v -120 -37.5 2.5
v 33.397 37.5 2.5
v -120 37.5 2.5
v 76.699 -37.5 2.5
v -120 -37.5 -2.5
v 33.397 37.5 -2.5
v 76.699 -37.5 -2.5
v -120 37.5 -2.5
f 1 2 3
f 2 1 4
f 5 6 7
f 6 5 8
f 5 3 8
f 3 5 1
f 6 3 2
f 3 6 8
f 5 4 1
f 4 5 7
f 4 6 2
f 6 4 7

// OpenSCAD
// file: ../fixings/tube_clamp_square_base_plate_132_functions.scad
function get_L_shaft_with_base_plate_square_base_plate_132(beam_width) = 
    // (beam_width == 40) ?
    75
;
function get_R_plate_square_base_plate_132(beam_width) = 
    // (beam_width == 40) ?
    [143, 75, 18.5]
;
function get_thickness_square_base_plate_132(beam_width) = 
    // (beam_width == 40) ?
    8
;
function get_offset_hole_x_square_base_plate_132(beam_width) = 
    // (beam_width == 40) ?
    100 / 2
;
function get_diameter_hole_square_base_plate_132(beam_width) = 
    // (beam_width == 40) ?
    10
;
// file: ../fixings/tube_clamp_round_base_plate_132_functions.scad
function get_L_shaft_with_base_plate_round_base_plate_132(tube_diameter) = 
    (tube_diameter == 27) ? 
        85
    : (tube_diameter == 42) ?
        122
    : 25
;
function get_R_plate_round_base_plate_132(tube_diameter) = 
    (tube_diameter == 27) ? 
        [64, 114, 7]
    : (tube_diameter == 42) ?
        [80, 140, 10]
    : [10, 20, 1]
;
function get_offset_hole_y_round_base_plate_132(tube_diameter) = 
    (tube_diameter == 27) ? 
        38
    : (tube_diameter == 42) ?
        50
    : 10
;
function get_diameter_hole_round_base_plate_132(tube_diameter) = 10;
// file: ../fixings/tube_clamp_round_3_way_through_116_functions.scad
function  get_L_shaft_long_round_3_way_through_116(tube_diameter) = 
    (tube_diameter == 27) ? 
        42
    : (tube_diameter == 42) ?
        60
    : 25
;
function get_thickness_round_3_way_through_116(tube_diameter) = 7;
function get_L_shaft_short_round_3_way_through_116(tube_diameter) = tube_diameter + 2 * get_thickness_round_3_way_through_116();
// file: ../fixings/tube_clamp_round_tee_long_104_functions.scad
// include <../../config.scad>;

function get_L_shaft_long_round_tee_long_104(tube_diameter) = 
    (tube_diameter == 27) ? 
        85
    : (tube_diameter == 42) ?
        122
    : 25
;
function get_L_shaft_short_round_tee_long_104(tube_diameter) = 
    (tube_diameter == 27) ? 
        42
    : (tube_diameter == 42) ?
        61
    : 10
;
// file: brake_assembly_functions.scad
// include <../../config.scad>; // circular reference!

function get_y_pos_lead_fixing_ballscrew_to_brake_arms(angle_brake_rod, y_pos_axle_rear, x_pos_axle_leg_rear, x_offset_fixing_brake_arm_to_lead_plate) = y_pos_axle_rear + (x_pos_axle_leg_rear - x_offset_fixing_brake_arm_to_lead_plate) / tan(angle_brake_rod); // (X_POS_AXLE_LEG_REAR - X_OFFSET_FIXING_BRAKE_ARM_TO_LEAD_PLATE)
// file: ../common/metric_bolt_functions.scad
function get_metric_bolt_head_height(size) = size;
function get_metric_bolt_head_diameter(size) = size * 2;
function get_metric_bolt_washer_diameter_safe_working_clearance(size) = 
    (size < 20) ?
        4 * size
    :
        3 * size
;
// main file
include <../../config.scad>;


module brake_arm() {
    L_big = 2 * max(R_BRAKE_ARM);
    color(COLOUR_BEAM_ALUMINIUM) difference() {
        // body
        cube(R_BRAKE_ARM, center = true);
        // chamfer across end face for wheel overlap
        translate([R_BRAKE_ARM[0] / 2 - R_BRAKE_ARM[1] / 2 * tan(ANGLE_BRAKE_ROD_MAX), 0, 0]) rotate([0, 0, 90 - ANGLE_BRAKE_ROD_MAX]) translate([0, -L_big / 2, -L_big / 2]) cube(L_big, center = false);
    }
    // Shopping
    echo(str("Brake arm: Aluminium sheet ", R_BRAKE_ARM[1], "mm x ", R_BRAKE_ARM[0], "mm x ", R_BRAKE_ARM[2], "mm - x1"));
}

brake_arm();
